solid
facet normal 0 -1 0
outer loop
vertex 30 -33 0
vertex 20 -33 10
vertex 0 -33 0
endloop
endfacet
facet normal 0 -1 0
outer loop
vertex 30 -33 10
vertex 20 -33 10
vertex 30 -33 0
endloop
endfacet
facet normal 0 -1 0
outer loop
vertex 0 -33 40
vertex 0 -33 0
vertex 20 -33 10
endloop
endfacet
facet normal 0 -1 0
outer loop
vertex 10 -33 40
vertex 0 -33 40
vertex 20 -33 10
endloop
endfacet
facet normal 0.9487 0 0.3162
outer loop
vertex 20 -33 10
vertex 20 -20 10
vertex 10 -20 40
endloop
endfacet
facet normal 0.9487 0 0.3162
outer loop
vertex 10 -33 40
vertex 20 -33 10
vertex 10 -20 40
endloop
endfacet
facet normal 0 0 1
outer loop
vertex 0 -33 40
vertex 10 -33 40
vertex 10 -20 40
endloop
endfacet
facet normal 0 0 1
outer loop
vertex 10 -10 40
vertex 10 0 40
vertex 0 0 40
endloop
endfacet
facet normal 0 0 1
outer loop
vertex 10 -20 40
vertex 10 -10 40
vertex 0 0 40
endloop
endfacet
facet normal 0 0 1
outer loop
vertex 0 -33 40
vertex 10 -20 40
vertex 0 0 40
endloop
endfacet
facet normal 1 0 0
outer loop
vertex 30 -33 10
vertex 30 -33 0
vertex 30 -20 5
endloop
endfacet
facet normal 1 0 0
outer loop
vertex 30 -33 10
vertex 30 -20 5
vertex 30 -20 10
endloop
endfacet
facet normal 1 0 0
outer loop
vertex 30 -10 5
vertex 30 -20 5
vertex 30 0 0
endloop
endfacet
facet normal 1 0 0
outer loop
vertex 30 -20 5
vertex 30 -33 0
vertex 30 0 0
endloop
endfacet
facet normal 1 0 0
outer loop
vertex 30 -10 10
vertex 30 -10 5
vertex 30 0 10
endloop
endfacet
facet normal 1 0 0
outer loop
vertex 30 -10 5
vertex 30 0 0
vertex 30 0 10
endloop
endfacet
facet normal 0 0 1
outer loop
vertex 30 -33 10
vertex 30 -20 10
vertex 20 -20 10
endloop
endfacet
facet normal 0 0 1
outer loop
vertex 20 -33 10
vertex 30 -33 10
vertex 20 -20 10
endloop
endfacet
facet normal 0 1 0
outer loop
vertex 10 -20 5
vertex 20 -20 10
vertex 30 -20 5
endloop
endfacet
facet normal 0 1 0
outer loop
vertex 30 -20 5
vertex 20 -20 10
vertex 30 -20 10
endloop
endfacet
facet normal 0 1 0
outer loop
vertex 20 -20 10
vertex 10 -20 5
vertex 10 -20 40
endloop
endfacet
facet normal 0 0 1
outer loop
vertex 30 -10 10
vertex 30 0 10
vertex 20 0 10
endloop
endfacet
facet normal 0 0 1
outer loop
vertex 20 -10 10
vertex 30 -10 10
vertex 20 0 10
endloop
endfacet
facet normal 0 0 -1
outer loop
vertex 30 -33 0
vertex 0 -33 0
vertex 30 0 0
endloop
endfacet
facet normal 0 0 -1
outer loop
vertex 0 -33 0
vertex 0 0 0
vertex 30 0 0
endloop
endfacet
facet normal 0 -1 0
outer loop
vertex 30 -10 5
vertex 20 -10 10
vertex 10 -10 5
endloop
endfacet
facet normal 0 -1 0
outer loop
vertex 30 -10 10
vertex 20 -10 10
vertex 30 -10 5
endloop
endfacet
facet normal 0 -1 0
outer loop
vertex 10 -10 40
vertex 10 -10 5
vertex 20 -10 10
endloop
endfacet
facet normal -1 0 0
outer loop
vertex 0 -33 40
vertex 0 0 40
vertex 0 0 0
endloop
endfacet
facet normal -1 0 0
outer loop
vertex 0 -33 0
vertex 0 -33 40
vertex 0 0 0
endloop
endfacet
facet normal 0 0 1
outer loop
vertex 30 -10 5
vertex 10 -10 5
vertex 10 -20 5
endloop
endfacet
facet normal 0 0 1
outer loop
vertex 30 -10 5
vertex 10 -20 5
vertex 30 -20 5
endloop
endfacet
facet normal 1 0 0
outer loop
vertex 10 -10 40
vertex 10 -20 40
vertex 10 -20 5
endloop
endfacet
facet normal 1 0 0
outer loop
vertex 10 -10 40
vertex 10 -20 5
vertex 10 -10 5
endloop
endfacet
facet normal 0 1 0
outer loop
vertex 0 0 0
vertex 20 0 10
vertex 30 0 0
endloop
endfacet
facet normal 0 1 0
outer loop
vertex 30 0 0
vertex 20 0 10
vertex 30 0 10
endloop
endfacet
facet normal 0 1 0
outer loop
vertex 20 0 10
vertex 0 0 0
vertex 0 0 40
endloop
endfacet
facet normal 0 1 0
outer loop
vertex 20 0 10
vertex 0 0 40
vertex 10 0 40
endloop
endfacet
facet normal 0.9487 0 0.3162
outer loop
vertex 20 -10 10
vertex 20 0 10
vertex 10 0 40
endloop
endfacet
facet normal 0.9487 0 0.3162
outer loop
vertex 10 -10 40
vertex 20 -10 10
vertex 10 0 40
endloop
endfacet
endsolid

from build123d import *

# Parameters (mm, degrees)
F1_DEPTH = 3
F2_DEPTH = 30
F3_W     = 20
F3_H     = 10
F4_DEPTH = 35


with BuildPart() as f1:
    # F0 (on Front) → F1 (new body)
    with BuildSketch(Plane.XZ):
        Polygon((0, 40), (0, 0), (30, 0), (30, 10), (20, 10), (10, 40), align=None)
    extrude(amount=F1_DEPTH)

    # F1_face (on face) → F2 (join)
    with BuildSketch(Plane(origin=(10.666667, -3, 16), x_dir=(1, 0, 0), z_dir=(0, -1, 0))):
        Polygon((-10.666667, 24), (-10.666667, -16), (19.333333, -16), (19.333333, -6), (9.333333, -6), (-0.666667, 24), align=None)
    extrude(amount=F2_DEPTH)

    # F3 (on face) → F4 (cut)
    with BuildSketch(Plane.XY.offset(40)):
        with Locations((20, -15)):
            Rectangle(F3_W, F3_H)
    extrude(amount=-F4_DEPTH, mode=Mode.SUBTRACT)


solid = f1.part
